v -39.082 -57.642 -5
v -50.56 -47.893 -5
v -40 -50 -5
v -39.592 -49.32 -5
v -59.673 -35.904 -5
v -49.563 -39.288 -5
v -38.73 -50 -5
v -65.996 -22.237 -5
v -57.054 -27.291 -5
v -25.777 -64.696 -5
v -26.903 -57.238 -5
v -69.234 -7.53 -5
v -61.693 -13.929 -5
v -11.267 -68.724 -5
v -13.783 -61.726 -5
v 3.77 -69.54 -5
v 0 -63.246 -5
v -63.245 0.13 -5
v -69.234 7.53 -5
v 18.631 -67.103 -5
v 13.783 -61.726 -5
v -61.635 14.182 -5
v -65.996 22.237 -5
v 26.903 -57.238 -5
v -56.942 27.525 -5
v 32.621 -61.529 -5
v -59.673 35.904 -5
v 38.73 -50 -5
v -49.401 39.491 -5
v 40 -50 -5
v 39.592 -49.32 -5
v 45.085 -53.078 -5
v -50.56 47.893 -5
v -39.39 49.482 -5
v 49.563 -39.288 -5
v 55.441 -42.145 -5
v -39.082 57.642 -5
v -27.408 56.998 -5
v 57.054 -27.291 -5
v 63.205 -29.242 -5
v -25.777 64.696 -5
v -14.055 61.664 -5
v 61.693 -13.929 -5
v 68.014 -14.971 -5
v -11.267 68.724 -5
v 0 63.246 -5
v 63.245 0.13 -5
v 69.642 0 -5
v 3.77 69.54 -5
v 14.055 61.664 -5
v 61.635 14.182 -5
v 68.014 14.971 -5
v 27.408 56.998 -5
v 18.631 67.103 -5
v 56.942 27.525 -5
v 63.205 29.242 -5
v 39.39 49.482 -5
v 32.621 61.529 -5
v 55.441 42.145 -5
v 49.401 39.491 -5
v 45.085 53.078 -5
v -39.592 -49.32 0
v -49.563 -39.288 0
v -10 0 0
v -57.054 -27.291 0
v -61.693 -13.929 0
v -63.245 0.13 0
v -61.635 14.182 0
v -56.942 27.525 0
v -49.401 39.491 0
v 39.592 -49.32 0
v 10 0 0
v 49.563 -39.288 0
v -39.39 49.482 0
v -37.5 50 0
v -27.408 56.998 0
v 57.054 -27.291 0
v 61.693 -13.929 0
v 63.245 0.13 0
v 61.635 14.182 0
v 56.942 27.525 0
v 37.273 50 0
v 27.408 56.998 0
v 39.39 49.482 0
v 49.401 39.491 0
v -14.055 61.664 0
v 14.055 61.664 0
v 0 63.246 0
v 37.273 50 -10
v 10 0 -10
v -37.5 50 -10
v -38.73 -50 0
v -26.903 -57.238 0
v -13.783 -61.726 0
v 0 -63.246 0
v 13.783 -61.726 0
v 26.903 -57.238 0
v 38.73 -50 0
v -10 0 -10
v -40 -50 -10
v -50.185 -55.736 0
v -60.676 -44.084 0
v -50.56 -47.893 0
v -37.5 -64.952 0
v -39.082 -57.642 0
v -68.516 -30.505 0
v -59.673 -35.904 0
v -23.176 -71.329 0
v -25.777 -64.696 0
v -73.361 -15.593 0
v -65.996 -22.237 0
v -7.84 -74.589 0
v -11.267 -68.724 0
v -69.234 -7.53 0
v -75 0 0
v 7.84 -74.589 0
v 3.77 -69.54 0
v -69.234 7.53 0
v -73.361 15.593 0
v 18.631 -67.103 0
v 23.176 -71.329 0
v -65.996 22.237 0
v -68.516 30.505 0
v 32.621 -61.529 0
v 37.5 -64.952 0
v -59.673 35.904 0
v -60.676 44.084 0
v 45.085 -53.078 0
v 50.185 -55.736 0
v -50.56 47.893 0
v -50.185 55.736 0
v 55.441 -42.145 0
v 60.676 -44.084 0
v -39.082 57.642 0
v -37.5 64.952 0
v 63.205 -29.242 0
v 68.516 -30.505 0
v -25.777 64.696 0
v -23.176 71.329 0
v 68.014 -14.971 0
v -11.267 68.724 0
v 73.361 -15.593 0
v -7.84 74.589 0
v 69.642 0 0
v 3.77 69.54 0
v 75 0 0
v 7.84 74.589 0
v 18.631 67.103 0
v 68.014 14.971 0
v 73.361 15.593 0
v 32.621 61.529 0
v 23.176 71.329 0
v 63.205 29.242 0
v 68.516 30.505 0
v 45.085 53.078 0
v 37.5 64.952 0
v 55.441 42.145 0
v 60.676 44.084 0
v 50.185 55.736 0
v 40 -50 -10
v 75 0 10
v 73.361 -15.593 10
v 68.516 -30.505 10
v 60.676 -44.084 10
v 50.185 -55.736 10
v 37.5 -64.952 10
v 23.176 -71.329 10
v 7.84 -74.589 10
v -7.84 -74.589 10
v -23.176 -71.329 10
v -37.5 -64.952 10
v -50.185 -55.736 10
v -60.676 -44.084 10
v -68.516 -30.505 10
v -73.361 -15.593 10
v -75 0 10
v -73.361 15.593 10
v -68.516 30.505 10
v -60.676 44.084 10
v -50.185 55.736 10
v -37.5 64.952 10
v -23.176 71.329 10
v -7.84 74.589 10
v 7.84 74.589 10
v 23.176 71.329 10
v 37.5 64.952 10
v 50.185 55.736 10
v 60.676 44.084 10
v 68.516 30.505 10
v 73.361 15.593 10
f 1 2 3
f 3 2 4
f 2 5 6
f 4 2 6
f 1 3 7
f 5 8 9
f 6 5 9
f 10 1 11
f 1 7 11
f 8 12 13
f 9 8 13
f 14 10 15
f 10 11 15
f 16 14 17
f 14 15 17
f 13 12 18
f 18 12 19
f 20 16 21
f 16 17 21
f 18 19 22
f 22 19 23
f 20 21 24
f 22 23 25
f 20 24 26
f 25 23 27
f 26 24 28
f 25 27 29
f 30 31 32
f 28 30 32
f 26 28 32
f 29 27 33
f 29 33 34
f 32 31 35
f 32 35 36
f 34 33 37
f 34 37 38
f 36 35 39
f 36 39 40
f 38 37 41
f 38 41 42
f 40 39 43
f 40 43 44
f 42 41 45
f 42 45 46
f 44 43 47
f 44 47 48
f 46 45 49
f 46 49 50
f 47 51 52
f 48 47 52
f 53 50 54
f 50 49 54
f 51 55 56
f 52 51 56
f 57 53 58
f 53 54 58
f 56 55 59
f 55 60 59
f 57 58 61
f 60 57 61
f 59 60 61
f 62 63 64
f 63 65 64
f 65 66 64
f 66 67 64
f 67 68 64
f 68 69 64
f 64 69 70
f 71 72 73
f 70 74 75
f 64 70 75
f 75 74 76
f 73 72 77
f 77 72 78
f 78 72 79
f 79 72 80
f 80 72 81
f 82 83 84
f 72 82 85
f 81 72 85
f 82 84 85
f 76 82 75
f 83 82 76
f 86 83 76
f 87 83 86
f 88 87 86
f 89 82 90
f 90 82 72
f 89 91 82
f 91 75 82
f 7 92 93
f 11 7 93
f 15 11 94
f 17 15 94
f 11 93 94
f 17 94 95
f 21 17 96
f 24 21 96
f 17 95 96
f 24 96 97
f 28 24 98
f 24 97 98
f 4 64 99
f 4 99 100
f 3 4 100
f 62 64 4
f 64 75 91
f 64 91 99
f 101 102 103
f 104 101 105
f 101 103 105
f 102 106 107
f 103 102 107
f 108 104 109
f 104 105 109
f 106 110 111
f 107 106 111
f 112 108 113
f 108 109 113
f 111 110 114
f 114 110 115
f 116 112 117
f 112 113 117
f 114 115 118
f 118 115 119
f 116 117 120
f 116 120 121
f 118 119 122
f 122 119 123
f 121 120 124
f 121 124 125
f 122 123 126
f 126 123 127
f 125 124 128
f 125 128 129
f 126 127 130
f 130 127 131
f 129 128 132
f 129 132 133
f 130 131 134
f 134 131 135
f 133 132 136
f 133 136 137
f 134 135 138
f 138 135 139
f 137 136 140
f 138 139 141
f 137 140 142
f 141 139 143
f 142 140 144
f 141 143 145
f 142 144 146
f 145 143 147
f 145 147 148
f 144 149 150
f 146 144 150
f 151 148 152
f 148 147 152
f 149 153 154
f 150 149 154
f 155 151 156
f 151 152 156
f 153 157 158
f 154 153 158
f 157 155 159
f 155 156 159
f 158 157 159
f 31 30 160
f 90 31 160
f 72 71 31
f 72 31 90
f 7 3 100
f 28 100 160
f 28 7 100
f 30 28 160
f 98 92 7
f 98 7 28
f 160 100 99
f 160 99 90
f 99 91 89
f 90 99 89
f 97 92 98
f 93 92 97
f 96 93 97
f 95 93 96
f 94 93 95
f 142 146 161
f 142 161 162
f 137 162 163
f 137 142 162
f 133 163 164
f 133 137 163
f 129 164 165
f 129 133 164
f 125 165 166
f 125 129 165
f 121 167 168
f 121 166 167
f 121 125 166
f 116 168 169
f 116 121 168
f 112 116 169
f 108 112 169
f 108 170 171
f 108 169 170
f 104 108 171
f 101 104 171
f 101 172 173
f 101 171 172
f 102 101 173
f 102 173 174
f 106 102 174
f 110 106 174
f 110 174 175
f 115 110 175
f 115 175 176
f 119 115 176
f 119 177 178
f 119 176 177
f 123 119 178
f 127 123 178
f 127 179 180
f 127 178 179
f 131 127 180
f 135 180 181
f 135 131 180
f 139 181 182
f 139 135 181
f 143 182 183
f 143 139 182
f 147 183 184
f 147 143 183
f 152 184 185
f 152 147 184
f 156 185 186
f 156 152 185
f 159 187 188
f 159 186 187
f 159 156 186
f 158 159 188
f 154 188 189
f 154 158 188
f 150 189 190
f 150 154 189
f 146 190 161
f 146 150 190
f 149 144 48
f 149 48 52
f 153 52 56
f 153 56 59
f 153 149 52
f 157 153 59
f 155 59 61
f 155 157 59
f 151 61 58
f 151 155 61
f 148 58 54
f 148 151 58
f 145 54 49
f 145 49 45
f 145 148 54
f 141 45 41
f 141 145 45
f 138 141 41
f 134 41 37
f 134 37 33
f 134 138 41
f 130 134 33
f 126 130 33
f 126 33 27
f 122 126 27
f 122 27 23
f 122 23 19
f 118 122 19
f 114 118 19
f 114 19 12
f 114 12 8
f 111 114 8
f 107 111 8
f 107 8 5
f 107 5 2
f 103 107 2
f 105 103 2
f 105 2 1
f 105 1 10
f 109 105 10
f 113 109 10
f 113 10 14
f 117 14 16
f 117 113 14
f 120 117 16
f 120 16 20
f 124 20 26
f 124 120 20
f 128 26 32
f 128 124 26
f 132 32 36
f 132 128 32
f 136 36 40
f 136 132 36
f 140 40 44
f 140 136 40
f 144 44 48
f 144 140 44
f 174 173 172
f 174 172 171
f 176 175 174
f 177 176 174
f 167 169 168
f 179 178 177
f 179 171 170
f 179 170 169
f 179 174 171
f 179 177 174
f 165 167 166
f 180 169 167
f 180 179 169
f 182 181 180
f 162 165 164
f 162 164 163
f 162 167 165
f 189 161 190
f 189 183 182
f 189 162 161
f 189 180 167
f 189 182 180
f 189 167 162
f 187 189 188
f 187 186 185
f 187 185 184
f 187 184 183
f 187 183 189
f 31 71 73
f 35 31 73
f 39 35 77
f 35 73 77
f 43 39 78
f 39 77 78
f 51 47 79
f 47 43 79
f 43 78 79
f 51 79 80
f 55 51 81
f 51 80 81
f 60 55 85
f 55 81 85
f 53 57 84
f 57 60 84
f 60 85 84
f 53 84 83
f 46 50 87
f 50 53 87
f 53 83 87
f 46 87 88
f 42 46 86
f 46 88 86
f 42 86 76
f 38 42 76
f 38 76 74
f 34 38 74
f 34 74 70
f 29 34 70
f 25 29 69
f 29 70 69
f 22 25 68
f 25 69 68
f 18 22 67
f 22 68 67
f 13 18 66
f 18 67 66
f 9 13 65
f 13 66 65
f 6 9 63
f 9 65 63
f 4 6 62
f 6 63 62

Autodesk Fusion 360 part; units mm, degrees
sketch "Sketch1" plane through (0, 0, 0) normal (0, 0, 1) x (1, 0, 0)
  circle A0 centre (0, 0) radius 75
extrude "Extrude1" add sketch "Sketch1" along normal blind 10
sketch "Sketch2" plane through (0, 0, 0) normal (0, 0, 1) x (1, 0, 0)
  circle A0 centre (0, 0) radius 69.6419
  circle A1 centre (0, 0) radius 63.2456
extrude "Extrude2" add sketch "Sketch2" against normal blind 5
sketch "Sketch3" plane through (0, 0, 0) normal (0, 0, 1) x (1, 0, 0)
  line L0 (-40, 50) -> (-35, 50)
  line L1 (-40, 50) -> (-37.5, 50)
  line L2 (40, 50) -> (-40, 50)
  line L3 (-37.5, 50) -> (-10, 0)
  line L4 (-10, 0) -> (-40, -50)
  line L5 (-40, -50) -> (40, -50)
  line L6 (40, -50) -> (10, 0)
  line L7 (40, 55) -> (10, 0)
extrude "Extrude3" add 1 faces at (67.2505, -3.4599, -5) along direction (0, 0, 1) blind 5
extrude "Extrude4" add sketch "Sketch3" against normal blind 10
sketch "Sketch4" plane through (0, 0, 0) normal (0, 0, 1) x (1, 0, 0)
